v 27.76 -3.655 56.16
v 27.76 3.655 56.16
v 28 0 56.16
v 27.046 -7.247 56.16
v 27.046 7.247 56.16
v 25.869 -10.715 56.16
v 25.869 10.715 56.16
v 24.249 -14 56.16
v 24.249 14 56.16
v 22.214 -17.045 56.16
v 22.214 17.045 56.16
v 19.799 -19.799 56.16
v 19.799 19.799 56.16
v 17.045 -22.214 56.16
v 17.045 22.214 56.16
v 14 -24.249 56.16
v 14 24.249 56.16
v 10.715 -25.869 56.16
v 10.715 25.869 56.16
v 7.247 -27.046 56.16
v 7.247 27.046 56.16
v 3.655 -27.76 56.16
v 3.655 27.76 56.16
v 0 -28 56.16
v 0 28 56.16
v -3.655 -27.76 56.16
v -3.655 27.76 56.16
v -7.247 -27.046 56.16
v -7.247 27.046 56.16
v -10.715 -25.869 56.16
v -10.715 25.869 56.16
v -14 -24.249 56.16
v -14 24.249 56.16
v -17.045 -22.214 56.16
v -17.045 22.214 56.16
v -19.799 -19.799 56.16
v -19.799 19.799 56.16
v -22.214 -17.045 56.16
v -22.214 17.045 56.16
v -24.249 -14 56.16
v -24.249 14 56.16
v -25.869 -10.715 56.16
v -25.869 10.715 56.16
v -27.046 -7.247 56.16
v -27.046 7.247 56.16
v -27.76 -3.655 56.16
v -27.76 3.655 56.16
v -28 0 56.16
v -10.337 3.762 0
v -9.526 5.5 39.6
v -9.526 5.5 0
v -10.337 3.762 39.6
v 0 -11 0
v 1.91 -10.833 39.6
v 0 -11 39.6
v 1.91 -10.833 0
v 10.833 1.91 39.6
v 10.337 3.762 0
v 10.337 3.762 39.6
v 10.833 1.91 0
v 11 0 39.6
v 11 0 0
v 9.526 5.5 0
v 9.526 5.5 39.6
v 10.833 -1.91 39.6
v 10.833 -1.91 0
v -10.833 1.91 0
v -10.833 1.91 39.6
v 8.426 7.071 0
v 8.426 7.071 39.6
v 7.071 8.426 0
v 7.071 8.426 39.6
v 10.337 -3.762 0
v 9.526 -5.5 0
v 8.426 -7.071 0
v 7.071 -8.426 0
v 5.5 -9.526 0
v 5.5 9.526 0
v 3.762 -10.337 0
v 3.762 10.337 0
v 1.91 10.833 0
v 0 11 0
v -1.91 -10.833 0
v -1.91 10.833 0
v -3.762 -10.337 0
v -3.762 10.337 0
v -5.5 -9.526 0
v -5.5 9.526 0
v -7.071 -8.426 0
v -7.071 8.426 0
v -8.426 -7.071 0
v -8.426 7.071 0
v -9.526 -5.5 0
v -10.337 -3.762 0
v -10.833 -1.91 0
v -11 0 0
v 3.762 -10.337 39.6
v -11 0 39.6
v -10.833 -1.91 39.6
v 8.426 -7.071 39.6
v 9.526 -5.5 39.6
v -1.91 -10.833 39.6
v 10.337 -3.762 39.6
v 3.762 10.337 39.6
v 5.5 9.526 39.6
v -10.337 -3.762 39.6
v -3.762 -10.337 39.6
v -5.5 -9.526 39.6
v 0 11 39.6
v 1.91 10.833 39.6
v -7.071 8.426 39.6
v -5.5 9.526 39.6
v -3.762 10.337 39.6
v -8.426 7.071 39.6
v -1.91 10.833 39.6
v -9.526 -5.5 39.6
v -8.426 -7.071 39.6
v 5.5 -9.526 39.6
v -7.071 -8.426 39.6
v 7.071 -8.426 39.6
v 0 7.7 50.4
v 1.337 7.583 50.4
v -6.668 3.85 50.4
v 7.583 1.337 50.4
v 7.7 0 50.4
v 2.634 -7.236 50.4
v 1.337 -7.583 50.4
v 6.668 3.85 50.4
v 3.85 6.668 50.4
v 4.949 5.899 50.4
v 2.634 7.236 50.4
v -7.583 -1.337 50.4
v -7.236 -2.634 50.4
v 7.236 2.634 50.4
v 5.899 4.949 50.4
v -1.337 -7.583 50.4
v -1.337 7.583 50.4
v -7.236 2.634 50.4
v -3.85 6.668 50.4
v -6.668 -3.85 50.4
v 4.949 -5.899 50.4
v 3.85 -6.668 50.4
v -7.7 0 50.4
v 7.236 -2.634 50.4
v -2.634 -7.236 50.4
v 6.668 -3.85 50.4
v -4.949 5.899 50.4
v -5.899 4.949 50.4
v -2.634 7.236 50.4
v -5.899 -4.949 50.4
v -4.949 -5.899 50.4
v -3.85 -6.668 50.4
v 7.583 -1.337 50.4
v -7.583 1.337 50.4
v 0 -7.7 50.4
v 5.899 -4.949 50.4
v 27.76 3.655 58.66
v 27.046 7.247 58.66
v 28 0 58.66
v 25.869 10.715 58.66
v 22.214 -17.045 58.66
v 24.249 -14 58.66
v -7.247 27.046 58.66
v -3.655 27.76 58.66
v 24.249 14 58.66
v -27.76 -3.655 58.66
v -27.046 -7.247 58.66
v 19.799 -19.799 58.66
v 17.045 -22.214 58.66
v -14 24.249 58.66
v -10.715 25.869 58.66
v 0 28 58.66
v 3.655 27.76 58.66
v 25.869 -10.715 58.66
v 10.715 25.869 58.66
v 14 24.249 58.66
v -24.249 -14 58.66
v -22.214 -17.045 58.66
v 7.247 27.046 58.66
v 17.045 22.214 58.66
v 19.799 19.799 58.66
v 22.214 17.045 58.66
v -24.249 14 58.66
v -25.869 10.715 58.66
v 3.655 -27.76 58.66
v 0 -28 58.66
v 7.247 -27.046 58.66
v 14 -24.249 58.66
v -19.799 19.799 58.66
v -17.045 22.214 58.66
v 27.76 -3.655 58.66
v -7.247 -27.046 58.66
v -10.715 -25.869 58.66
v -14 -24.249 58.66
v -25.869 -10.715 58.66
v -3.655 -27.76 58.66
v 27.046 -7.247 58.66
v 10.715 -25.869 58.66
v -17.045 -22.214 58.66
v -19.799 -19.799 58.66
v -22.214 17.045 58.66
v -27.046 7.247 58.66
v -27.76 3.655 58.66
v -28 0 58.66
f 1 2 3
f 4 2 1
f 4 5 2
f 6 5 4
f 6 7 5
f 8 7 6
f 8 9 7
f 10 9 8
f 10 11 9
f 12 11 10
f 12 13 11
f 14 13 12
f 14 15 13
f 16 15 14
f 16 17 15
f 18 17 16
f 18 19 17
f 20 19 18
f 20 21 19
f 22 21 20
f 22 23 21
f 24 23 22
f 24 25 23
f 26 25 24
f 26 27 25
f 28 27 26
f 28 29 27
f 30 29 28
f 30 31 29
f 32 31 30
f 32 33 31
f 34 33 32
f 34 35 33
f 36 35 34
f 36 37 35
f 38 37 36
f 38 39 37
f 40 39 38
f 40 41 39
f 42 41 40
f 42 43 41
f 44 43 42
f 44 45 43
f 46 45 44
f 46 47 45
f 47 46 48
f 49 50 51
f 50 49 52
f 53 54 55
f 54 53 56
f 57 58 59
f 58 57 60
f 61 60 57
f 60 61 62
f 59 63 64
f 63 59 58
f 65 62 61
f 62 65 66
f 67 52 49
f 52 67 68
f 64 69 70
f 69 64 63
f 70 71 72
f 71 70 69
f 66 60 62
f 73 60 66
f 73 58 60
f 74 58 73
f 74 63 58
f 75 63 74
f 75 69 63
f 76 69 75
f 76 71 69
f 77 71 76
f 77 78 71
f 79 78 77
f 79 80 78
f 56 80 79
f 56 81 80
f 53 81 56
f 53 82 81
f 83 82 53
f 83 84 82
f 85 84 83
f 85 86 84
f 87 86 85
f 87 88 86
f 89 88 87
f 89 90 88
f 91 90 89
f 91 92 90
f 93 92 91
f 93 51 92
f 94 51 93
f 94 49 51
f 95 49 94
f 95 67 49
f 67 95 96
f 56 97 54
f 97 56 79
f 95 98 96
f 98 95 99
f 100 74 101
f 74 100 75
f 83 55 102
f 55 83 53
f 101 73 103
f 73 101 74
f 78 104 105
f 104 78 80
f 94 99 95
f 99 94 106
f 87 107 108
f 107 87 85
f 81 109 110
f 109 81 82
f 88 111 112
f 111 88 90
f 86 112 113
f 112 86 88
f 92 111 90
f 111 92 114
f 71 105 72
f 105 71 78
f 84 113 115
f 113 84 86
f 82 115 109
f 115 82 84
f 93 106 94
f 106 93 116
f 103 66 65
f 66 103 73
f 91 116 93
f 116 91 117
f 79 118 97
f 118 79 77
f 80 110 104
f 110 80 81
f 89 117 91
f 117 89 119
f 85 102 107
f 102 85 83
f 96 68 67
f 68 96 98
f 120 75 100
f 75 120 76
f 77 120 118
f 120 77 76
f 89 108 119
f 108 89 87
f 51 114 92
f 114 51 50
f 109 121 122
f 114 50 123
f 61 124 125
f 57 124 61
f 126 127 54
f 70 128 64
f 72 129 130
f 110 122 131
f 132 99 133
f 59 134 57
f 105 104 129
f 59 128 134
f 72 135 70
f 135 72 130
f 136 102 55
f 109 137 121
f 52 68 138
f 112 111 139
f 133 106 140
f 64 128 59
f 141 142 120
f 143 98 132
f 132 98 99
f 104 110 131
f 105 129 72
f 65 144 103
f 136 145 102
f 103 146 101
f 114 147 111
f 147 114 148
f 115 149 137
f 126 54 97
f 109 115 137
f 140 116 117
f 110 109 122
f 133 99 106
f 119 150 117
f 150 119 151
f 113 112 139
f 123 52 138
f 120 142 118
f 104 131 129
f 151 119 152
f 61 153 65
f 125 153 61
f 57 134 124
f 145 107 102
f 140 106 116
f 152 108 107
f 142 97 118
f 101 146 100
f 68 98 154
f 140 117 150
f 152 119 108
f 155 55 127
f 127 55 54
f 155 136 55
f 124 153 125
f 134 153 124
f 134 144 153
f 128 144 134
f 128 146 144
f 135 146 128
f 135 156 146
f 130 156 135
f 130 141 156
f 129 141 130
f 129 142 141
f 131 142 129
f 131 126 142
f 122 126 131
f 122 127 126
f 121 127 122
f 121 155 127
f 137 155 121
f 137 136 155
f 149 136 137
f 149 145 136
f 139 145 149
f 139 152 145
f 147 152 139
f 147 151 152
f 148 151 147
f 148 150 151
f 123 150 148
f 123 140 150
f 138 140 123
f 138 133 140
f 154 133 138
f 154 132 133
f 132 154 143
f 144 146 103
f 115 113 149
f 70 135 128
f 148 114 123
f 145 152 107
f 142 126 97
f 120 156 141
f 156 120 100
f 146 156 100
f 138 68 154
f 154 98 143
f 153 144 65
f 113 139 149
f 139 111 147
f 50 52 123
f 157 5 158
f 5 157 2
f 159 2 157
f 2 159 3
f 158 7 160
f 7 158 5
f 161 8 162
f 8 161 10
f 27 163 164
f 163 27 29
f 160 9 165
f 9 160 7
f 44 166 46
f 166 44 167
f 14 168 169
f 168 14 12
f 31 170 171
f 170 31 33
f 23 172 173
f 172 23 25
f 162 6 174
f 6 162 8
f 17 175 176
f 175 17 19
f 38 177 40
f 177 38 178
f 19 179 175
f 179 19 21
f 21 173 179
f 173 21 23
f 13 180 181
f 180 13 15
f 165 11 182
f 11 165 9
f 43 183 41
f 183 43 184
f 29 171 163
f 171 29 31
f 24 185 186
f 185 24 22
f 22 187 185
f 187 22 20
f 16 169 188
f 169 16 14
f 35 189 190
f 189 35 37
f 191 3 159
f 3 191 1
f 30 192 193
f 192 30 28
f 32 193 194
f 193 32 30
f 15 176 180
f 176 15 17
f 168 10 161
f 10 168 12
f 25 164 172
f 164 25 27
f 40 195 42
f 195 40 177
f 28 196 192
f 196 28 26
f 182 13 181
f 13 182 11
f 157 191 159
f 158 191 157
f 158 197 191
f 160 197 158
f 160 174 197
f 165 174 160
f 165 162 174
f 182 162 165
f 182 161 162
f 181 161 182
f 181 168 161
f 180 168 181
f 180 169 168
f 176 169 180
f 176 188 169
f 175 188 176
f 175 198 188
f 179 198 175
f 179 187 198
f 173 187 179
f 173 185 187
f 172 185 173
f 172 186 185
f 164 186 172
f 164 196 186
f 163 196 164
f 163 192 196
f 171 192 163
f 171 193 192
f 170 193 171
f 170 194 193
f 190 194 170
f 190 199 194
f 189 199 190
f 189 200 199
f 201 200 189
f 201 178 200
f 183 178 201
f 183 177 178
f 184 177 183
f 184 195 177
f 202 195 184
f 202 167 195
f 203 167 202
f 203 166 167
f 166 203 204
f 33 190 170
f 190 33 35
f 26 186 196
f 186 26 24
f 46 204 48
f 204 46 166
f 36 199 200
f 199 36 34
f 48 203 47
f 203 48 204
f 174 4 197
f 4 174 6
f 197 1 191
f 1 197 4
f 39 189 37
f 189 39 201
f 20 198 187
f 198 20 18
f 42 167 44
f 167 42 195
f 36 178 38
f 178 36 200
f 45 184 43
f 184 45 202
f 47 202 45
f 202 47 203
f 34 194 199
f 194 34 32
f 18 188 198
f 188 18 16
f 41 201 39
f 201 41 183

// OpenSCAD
// ESFR upright, K=11.2 — large-drop storage sprinkler.
frame_d = 22;
deflector_d = 56;
total_h = 72;
union() {
    cylinder(h = total_h * 0.55, d = frame_d, $fn = 36);
    translate([0, 0, total_h * 0.55])
        cylinder(h = total_h * 0.15, d1 = frame_d, d2 = frame_d * 0.7, $fn = 36);
    translate([0, 0, total_h * 0.78])
        cylinder(h = 2.5, d = deflector_d, $fn = 48);
    for (a = [0:60:300]) rotate([0, 0, a])
        translate([deflector_d * 0.42, 0, total_h * 0.78])
            cylinder(h = 1.2, d = 3.5, $fn = 16);
}
